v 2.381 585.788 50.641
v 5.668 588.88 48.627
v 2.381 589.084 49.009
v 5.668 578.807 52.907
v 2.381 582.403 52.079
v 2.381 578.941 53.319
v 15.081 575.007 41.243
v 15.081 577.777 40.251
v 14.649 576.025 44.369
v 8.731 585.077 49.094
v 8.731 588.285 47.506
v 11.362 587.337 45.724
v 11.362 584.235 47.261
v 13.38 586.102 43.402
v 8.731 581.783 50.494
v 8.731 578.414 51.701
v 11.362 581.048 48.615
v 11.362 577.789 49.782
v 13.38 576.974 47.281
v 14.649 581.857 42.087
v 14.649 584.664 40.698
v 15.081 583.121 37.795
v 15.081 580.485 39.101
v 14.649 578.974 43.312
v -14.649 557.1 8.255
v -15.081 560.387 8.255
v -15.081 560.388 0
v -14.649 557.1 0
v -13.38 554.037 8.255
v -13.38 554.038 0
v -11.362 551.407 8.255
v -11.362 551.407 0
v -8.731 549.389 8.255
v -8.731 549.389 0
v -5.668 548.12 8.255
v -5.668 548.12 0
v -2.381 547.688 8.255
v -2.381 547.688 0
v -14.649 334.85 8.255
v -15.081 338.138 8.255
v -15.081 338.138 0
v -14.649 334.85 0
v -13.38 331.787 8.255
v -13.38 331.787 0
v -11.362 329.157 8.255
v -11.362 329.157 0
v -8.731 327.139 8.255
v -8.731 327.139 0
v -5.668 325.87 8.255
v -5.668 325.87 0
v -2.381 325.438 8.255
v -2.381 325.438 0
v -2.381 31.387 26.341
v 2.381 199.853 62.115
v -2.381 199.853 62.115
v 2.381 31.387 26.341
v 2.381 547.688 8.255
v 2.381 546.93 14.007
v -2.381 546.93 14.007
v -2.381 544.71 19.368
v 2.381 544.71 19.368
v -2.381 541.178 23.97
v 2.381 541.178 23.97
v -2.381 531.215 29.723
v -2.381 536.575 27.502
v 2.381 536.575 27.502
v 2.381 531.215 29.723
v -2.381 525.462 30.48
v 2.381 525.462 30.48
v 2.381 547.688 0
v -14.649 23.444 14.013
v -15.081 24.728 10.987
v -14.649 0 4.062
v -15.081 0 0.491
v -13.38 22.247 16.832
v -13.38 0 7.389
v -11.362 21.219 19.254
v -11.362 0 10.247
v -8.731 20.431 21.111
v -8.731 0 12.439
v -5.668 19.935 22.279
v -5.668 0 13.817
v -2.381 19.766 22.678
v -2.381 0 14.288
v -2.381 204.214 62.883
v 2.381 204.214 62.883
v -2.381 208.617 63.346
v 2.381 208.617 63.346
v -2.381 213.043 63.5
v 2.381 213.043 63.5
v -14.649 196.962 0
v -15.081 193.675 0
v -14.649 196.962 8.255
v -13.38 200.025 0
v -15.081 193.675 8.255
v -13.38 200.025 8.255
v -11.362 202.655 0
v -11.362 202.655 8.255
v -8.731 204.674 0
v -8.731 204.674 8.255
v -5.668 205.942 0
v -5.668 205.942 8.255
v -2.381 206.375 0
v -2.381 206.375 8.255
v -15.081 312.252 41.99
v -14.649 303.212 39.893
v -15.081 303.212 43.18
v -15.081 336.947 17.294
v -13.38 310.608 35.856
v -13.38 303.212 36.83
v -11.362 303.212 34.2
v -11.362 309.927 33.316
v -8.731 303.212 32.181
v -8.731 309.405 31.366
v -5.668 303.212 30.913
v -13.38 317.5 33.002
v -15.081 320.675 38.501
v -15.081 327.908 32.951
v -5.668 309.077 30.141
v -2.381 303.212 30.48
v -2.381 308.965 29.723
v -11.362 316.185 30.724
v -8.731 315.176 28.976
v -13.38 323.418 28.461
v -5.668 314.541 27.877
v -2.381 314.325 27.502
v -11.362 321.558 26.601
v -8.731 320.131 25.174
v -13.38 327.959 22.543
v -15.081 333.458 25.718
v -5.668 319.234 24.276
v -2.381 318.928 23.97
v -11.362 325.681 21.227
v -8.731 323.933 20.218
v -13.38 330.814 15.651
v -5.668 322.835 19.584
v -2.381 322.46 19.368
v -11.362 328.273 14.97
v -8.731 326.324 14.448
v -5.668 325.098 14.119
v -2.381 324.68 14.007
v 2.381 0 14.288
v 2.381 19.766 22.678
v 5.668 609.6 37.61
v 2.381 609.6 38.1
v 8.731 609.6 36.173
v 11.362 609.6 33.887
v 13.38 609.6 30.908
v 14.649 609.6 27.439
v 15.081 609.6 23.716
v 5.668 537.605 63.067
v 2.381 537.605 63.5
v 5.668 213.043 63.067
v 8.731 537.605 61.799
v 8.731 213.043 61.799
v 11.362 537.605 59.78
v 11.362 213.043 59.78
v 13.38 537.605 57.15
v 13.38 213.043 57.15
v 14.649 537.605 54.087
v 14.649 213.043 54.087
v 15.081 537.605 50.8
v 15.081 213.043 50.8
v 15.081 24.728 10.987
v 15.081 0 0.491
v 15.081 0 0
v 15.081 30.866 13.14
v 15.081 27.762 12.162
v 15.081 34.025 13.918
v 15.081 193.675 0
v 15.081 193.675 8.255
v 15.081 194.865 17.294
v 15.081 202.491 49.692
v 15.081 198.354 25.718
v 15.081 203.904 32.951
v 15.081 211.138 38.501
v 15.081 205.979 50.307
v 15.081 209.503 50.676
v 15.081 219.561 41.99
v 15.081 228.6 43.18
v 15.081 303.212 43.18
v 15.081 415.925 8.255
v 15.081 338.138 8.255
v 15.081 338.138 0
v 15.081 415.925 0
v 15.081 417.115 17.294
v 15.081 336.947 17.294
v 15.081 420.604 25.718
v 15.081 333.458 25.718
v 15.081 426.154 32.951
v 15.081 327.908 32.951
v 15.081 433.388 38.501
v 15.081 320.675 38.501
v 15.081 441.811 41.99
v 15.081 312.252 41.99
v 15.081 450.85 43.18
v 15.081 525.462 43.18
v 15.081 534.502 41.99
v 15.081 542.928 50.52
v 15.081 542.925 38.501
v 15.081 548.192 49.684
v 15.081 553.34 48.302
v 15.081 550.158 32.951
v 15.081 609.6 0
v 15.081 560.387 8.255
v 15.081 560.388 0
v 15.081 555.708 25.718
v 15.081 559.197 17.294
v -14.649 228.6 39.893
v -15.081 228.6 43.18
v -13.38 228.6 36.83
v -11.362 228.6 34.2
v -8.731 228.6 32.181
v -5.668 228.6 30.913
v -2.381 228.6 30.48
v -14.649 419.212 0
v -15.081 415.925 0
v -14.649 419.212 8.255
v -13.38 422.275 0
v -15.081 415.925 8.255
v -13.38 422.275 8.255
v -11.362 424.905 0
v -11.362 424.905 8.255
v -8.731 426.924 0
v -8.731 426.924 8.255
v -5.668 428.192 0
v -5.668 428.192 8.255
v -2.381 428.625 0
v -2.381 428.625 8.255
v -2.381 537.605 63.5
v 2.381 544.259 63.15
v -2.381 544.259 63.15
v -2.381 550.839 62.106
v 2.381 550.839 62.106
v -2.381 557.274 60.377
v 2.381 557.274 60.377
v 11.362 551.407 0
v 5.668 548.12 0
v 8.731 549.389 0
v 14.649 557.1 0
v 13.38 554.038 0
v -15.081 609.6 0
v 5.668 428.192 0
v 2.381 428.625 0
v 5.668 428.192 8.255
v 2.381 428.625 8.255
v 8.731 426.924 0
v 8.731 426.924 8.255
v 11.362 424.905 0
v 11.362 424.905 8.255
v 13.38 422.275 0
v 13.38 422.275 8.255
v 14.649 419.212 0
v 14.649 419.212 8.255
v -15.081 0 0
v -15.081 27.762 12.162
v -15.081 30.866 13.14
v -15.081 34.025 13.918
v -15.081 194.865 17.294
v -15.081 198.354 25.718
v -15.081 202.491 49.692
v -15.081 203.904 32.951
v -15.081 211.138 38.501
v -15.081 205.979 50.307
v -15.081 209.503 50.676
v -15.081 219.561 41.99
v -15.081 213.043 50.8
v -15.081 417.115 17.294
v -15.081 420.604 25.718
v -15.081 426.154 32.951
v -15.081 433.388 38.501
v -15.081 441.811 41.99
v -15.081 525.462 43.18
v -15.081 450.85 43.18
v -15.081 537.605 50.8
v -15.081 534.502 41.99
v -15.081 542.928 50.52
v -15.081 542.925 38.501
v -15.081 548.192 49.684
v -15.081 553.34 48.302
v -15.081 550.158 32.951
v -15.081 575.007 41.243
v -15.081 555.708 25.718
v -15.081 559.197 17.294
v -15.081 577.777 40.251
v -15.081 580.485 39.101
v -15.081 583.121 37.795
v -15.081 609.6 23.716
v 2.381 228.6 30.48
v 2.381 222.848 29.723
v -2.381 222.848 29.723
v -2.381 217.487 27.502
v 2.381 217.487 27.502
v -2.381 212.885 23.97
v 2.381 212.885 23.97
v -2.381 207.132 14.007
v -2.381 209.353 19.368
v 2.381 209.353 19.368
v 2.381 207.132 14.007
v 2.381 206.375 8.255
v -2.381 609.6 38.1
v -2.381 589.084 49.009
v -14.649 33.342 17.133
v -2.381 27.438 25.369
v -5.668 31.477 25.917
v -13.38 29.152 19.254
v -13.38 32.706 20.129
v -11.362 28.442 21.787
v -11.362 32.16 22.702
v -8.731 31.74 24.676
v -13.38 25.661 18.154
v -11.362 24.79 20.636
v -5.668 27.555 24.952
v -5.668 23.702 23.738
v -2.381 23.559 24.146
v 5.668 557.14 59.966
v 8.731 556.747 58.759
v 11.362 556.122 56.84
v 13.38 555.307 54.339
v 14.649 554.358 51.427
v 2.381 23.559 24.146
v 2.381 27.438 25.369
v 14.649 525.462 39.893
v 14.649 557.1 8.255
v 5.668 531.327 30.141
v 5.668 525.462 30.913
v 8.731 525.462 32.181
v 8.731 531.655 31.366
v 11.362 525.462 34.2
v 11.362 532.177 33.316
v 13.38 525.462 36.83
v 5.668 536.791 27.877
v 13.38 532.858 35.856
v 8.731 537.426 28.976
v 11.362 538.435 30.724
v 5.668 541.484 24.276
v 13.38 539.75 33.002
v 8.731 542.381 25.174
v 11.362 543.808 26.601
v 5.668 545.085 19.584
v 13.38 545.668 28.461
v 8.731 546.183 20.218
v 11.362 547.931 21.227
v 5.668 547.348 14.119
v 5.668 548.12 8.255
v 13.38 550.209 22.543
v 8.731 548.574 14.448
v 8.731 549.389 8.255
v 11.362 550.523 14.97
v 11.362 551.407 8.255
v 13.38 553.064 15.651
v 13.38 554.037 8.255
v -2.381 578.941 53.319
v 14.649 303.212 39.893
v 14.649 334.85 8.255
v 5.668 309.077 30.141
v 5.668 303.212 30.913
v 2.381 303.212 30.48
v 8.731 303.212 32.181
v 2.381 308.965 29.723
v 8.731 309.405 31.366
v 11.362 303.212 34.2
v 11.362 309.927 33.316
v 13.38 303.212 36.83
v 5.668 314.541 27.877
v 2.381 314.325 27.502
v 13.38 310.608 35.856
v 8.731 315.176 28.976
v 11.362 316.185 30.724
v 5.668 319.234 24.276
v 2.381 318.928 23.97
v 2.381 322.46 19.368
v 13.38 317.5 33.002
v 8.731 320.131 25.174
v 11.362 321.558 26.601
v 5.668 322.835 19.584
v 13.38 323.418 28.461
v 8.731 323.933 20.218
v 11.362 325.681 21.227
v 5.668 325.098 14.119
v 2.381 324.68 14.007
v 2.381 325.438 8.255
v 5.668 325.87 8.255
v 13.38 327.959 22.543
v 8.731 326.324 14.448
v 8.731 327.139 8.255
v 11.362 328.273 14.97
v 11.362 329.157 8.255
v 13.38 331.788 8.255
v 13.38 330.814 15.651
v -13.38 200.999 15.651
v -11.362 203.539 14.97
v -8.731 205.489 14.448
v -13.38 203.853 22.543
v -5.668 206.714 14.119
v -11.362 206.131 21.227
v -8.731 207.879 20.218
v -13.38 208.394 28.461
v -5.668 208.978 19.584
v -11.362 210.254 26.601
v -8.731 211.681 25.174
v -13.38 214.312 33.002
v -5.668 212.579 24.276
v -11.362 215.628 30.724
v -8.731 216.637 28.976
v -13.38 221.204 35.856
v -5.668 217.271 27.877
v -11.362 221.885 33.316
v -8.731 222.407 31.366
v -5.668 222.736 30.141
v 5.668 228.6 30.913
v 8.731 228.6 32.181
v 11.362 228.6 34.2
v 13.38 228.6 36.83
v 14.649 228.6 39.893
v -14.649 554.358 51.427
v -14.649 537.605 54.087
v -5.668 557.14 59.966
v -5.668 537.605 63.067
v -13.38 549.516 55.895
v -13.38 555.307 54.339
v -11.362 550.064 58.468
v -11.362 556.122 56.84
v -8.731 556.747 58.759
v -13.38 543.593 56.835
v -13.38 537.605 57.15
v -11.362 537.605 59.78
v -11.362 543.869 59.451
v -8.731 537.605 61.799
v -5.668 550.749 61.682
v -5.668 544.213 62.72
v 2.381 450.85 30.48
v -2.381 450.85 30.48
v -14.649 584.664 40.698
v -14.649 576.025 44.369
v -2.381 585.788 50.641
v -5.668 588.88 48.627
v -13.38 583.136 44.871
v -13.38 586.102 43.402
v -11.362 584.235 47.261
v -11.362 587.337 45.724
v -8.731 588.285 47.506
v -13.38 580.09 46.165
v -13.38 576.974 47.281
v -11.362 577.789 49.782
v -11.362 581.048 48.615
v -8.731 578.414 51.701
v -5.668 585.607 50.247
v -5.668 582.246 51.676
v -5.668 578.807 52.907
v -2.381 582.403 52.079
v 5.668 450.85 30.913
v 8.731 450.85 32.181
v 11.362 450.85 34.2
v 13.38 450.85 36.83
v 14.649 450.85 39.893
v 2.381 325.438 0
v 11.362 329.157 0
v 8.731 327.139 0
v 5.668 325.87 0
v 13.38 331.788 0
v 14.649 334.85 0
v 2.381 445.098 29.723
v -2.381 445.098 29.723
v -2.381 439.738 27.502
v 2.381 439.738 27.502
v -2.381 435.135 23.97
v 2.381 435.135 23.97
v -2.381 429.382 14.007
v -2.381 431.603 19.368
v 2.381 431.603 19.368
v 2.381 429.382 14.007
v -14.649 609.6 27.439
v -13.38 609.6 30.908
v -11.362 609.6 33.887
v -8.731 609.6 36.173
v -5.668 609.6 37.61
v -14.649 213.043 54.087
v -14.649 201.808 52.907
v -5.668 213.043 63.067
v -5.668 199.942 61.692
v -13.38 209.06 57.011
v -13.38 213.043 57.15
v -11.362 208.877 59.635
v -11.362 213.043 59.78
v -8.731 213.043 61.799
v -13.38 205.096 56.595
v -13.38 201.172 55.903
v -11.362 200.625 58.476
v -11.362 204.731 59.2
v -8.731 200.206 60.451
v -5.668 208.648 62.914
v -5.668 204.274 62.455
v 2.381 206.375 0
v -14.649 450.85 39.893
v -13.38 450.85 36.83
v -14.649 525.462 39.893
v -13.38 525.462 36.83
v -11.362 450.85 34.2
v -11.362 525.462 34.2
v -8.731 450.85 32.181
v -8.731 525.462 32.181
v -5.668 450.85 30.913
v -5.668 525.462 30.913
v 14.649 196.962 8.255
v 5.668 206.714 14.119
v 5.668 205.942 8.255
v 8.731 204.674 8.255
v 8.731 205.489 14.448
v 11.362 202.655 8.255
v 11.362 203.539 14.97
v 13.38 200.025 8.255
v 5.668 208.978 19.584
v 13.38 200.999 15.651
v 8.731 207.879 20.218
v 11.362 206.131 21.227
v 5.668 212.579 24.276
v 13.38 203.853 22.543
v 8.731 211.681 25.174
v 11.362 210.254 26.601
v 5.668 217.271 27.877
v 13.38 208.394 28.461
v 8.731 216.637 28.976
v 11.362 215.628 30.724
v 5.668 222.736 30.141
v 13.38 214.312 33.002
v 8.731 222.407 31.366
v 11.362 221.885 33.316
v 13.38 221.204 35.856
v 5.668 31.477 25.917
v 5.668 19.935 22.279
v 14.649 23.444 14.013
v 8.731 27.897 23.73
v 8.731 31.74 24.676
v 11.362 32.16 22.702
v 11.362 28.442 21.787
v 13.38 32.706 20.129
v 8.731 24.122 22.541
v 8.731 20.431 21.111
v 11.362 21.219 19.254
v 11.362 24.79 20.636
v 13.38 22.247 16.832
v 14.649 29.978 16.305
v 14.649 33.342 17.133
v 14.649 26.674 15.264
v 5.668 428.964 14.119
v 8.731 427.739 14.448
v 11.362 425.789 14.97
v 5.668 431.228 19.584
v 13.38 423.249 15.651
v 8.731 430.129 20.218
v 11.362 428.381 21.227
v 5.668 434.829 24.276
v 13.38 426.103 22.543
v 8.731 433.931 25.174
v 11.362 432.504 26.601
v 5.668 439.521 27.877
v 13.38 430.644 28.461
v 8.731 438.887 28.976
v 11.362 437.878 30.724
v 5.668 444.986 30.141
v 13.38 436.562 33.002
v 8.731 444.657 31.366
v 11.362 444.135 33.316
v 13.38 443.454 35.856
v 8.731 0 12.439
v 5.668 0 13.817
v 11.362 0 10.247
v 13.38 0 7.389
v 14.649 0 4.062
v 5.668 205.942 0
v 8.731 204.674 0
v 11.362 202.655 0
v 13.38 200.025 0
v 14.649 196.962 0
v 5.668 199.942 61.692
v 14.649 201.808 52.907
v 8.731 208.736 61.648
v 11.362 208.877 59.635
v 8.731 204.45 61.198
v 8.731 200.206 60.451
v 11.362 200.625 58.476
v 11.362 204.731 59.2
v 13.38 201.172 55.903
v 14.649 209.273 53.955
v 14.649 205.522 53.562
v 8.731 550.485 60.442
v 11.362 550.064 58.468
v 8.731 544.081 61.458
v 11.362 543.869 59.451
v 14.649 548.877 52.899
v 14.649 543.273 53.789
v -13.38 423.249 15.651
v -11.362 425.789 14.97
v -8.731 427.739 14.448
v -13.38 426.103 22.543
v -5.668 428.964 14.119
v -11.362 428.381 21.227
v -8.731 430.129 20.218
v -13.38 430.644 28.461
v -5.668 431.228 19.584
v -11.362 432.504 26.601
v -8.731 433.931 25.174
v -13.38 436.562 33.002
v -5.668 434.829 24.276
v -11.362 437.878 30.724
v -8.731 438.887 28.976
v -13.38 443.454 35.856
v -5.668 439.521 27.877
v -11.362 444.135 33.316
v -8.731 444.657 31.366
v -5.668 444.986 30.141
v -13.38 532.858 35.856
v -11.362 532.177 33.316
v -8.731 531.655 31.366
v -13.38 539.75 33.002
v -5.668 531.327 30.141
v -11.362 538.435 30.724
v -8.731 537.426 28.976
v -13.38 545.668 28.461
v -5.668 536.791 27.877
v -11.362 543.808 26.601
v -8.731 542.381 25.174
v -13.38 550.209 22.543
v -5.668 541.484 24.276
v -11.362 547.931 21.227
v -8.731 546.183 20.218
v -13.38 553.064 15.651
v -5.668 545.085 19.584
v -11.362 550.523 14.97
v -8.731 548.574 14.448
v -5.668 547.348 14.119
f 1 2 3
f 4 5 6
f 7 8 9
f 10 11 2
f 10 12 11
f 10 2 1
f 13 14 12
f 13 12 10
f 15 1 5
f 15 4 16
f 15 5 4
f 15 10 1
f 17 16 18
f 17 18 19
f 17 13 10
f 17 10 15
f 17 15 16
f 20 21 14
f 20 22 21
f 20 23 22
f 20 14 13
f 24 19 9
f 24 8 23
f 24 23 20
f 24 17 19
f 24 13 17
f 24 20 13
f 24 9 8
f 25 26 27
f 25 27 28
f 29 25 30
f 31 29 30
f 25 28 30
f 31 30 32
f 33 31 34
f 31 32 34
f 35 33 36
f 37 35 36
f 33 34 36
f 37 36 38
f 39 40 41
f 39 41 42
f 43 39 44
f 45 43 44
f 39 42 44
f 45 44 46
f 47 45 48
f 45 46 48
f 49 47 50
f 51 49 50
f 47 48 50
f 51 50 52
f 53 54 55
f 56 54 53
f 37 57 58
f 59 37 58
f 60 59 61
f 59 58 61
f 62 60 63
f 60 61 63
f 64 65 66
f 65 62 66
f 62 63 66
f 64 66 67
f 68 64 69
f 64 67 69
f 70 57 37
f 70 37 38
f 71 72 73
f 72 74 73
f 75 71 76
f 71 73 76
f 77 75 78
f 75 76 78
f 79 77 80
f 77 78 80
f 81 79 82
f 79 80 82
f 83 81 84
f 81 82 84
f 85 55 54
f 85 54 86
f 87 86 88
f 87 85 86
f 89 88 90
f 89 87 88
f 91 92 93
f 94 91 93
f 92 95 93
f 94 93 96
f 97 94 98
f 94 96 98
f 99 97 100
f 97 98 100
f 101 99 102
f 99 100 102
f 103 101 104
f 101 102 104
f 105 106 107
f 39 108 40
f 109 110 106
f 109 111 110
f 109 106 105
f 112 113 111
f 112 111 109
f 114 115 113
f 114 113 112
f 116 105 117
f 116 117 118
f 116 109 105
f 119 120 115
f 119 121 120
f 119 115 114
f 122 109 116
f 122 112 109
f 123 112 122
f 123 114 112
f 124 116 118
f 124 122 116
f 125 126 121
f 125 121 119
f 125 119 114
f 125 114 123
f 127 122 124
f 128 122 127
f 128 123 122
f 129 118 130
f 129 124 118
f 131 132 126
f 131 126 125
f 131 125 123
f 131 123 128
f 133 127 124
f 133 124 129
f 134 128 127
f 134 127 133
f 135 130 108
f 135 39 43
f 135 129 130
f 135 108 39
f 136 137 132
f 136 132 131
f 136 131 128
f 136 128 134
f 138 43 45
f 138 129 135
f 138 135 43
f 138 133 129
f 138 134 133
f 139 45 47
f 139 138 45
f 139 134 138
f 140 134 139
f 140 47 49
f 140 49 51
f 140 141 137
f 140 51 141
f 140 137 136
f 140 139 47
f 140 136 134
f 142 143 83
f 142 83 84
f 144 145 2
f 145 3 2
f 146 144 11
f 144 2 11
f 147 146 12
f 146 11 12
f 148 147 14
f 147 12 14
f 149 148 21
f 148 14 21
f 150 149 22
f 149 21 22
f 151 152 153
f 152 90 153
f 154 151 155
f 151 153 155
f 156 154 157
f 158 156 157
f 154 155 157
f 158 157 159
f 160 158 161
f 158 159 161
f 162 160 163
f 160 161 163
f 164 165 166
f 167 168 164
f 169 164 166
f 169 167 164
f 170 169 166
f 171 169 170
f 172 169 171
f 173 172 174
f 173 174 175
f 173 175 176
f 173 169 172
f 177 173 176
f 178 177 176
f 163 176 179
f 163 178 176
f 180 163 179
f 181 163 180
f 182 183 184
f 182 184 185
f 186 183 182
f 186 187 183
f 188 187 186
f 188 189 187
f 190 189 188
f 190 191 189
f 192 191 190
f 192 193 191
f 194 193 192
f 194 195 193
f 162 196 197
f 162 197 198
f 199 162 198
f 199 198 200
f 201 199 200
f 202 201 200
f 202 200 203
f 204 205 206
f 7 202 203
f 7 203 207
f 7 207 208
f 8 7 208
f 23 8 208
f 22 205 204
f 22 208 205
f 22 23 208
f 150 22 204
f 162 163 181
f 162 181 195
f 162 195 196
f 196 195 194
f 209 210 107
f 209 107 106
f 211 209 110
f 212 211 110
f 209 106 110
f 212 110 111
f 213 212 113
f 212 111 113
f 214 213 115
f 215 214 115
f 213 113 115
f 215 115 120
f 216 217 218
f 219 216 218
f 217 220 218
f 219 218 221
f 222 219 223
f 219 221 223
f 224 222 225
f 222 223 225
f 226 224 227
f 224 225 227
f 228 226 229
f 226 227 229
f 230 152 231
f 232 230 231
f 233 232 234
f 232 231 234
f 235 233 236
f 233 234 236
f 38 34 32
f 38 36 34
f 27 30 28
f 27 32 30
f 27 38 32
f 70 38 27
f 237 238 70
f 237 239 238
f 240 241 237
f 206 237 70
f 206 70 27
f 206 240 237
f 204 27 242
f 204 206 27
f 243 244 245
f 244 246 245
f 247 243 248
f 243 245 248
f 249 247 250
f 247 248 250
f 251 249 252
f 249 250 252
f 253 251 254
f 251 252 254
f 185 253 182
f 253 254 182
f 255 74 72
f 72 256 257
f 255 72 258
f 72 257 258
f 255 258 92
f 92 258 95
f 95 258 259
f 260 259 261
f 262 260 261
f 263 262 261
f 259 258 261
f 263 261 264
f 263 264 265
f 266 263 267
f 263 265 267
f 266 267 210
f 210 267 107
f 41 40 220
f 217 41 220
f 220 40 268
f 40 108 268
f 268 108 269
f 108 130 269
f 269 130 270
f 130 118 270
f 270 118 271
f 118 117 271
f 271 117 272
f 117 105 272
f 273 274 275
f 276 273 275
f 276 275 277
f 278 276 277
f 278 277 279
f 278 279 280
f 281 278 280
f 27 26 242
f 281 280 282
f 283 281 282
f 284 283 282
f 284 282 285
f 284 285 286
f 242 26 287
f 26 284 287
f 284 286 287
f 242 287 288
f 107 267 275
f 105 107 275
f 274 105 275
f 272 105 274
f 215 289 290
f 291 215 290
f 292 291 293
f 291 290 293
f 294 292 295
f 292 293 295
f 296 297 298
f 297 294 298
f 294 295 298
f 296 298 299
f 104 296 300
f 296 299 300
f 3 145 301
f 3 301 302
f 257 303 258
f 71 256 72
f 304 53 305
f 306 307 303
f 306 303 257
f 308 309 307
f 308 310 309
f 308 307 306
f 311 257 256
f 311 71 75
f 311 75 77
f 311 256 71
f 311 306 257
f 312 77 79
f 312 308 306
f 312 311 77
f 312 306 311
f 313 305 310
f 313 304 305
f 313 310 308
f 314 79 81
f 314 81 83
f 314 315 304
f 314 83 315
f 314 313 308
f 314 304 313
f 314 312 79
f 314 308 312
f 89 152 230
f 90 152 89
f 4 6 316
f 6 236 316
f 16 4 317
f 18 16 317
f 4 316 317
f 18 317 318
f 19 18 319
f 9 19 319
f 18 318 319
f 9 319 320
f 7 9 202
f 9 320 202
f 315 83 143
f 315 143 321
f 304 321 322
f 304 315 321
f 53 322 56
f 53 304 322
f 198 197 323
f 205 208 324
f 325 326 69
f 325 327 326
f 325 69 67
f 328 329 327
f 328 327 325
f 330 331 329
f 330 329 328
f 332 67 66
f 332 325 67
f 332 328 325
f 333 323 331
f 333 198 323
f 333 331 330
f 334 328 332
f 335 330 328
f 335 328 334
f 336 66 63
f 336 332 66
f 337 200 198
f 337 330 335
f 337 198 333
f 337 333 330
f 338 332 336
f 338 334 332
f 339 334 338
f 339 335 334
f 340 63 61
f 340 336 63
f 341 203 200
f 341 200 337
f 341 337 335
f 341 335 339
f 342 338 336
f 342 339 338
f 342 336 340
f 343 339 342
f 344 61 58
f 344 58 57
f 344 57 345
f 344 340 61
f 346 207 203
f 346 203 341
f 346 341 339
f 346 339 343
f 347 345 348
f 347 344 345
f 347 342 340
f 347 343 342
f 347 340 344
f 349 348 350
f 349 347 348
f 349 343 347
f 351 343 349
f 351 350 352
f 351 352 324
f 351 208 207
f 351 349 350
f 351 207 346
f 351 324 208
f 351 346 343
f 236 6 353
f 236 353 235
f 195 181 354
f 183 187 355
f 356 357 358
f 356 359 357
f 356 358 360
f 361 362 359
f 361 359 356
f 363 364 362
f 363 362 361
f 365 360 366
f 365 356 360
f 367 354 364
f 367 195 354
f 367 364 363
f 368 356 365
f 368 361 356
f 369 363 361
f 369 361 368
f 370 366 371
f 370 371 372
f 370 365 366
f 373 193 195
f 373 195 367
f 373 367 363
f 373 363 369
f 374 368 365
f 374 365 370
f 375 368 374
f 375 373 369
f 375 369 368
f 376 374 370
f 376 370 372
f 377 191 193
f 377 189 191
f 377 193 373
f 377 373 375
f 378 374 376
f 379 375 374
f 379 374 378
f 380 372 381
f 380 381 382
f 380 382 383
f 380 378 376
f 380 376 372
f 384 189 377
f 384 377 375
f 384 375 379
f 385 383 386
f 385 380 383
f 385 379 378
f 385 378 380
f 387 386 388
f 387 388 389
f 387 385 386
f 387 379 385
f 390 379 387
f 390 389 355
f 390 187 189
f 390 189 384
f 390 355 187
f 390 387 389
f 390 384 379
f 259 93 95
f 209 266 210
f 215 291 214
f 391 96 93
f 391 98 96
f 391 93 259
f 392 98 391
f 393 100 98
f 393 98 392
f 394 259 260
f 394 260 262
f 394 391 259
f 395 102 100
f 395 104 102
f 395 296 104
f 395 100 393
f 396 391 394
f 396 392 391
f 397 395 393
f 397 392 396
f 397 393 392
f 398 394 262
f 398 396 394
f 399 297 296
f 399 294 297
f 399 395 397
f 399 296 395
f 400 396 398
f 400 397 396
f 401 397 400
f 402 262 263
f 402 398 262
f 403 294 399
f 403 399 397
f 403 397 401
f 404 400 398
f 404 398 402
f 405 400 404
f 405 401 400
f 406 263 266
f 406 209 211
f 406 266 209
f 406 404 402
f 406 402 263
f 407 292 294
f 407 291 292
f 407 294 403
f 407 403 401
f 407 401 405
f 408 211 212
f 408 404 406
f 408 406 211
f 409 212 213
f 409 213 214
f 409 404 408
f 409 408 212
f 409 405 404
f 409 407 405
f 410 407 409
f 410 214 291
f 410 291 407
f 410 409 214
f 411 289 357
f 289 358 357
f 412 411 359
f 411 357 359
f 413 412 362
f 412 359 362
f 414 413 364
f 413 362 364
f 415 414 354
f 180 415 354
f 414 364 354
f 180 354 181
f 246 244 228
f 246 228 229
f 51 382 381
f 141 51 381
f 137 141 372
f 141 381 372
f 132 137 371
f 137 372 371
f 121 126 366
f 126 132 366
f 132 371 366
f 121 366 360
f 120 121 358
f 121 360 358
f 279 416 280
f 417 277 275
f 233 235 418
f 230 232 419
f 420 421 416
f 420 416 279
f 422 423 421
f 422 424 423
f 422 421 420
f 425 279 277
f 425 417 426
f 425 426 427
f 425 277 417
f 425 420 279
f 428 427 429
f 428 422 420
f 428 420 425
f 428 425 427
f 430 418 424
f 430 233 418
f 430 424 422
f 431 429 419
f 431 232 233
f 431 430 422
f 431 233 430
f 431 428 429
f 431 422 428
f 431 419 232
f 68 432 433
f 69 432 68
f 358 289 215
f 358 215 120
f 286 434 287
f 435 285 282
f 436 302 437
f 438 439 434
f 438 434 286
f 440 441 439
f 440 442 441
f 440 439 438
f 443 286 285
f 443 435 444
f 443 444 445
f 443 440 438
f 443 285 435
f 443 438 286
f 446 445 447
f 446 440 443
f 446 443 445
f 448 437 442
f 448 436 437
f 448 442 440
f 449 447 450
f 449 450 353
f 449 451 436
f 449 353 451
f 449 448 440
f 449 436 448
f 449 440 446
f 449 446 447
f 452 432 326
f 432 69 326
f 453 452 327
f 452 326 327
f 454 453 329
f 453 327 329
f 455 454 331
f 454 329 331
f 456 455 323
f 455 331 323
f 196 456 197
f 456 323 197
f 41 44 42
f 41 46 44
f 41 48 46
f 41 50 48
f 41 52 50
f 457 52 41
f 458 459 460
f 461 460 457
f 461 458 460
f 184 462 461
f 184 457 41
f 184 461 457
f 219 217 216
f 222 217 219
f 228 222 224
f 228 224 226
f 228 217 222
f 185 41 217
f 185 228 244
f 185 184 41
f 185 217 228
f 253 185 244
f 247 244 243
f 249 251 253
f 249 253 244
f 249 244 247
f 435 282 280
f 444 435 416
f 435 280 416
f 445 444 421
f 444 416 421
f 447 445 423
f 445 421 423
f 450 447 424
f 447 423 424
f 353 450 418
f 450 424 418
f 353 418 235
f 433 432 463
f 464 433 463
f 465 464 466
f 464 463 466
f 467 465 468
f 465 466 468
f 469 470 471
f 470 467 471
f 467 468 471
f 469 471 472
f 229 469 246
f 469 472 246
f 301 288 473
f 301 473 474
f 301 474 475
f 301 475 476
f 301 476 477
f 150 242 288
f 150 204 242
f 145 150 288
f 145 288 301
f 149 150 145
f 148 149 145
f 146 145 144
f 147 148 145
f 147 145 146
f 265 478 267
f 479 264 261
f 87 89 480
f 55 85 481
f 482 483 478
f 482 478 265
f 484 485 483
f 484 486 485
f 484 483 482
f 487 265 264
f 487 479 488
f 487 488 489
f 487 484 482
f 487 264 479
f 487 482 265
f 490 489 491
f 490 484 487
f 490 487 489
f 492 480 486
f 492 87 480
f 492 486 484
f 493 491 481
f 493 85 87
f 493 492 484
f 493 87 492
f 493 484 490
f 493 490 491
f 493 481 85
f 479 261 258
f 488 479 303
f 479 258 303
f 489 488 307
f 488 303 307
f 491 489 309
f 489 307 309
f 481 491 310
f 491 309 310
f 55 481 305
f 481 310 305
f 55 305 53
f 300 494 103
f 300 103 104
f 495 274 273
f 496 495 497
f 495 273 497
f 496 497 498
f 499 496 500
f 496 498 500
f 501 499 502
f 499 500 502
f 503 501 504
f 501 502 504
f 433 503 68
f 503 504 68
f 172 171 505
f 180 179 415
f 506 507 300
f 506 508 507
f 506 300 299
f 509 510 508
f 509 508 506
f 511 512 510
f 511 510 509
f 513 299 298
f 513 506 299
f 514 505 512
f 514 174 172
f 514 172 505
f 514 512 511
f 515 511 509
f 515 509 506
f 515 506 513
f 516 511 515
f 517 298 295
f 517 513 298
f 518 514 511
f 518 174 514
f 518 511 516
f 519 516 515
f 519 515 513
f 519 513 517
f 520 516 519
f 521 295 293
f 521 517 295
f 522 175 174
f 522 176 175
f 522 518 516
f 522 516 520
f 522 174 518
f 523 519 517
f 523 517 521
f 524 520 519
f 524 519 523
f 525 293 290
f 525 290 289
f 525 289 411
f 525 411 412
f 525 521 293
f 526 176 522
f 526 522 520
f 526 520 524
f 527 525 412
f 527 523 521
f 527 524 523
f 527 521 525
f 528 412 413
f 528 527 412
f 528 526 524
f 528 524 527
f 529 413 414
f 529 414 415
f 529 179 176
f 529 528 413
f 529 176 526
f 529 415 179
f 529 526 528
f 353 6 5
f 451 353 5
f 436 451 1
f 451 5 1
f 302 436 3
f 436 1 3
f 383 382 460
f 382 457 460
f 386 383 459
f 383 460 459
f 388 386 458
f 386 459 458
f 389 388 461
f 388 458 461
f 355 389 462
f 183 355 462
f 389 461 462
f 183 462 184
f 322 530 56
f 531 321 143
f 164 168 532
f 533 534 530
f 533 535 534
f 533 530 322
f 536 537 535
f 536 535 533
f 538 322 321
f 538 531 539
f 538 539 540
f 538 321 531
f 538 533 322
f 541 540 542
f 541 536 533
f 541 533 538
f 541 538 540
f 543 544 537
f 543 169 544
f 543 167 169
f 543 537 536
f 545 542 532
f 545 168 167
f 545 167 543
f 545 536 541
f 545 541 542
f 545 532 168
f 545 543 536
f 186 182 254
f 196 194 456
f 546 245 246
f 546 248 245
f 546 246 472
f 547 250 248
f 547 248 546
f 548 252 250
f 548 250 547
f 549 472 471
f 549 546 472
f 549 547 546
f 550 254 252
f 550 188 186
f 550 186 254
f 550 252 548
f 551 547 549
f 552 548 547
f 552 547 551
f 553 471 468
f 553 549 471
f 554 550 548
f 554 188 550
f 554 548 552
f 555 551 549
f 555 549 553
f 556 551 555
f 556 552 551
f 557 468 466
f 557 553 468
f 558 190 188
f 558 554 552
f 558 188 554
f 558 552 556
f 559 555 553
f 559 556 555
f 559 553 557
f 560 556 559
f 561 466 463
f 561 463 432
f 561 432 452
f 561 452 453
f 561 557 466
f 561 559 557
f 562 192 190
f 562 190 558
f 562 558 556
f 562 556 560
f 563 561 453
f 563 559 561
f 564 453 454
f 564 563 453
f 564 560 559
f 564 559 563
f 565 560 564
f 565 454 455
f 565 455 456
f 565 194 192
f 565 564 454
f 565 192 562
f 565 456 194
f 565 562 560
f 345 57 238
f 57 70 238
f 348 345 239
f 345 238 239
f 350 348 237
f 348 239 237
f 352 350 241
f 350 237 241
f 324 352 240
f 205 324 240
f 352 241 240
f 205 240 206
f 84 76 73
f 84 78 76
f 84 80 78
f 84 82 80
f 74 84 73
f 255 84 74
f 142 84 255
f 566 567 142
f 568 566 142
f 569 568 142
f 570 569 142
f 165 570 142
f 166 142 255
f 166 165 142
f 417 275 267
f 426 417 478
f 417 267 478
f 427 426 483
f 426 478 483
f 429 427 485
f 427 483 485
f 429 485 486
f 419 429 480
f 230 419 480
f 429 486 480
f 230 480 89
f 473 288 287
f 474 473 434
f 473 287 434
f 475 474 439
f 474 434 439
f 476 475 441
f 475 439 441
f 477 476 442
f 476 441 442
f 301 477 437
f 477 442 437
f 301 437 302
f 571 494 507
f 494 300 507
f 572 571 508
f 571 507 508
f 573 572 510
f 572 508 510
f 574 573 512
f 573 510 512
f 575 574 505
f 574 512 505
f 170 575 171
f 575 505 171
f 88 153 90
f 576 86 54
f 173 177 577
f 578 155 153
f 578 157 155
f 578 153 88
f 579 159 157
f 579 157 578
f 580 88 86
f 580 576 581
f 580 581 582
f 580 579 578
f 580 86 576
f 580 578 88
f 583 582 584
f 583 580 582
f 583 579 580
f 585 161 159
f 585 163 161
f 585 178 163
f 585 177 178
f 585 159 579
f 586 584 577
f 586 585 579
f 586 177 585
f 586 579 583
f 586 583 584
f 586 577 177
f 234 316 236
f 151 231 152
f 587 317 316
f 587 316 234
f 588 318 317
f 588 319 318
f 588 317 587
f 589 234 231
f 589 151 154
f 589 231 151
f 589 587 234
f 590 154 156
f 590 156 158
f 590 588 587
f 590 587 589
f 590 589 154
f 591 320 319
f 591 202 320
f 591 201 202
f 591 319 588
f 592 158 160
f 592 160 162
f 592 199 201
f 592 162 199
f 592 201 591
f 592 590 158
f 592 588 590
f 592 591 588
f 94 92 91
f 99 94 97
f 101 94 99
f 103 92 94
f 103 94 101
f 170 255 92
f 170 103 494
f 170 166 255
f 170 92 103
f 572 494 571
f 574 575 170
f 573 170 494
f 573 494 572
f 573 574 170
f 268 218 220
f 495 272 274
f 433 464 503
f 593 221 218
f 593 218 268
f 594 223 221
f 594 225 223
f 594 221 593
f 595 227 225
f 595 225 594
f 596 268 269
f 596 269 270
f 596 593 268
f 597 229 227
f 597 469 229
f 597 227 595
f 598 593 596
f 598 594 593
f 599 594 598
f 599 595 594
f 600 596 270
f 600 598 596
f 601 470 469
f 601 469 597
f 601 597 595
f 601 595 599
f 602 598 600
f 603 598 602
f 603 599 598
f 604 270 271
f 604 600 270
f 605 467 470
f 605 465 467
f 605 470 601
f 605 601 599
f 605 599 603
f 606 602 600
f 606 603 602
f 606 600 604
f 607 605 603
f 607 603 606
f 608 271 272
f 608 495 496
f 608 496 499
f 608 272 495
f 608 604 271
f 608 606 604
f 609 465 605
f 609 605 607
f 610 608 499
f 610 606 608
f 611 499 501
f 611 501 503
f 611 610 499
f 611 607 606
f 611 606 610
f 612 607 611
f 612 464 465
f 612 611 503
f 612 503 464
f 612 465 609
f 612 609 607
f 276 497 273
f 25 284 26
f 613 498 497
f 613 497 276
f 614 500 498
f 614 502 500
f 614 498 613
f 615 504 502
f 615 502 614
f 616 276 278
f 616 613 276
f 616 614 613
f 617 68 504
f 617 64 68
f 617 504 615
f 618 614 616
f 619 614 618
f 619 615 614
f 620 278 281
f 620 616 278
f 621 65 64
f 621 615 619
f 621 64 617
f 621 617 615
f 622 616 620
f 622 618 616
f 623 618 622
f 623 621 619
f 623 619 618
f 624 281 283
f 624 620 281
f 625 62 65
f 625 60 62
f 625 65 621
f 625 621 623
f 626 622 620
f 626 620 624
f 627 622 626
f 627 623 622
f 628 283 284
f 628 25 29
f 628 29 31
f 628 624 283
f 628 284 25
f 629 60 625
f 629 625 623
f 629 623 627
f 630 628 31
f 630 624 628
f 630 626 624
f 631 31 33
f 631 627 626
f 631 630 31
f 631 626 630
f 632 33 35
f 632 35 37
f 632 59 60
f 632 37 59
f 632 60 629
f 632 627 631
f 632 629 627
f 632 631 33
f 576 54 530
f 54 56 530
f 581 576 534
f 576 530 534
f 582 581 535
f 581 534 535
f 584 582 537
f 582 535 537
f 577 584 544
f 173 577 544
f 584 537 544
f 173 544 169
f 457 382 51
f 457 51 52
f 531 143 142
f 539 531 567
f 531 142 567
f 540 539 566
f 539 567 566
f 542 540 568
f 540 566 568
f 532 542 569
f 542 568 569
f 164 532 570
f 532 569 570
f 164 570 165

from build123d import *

# Parameters (mm, degrees)
F1_DEPTH      = 15.08125
F1_DEPTH_BACK = 15.08125
F2_R          = 63.5
F3_R          = 22.225
F4_R          = 12.7


with BuildPart() as f1:
    # F0 (on Right) → F1 (new body, two sides)
    with BuildSketch(Plane.YZ) as f1_sk:
        Polygon((0, 14.2875), (0, 0), (206.375, 0), (206.375, 30.48), (325.4375, 30.48), (325.4375, 0), (428.625, 0), (428.625, 30.48), (547.6875, 30.48), (547.6875, 0), (609.6, 0), (609.6, 38.1), (584.2, 51.60542), (547.6875, 63.5), (206.375, 63.5), (25.4, 25.06916), align=None)
    extrude(amount=F1_DEPTH)
    extrude(f1_sk.sketch, amount=-F1_DEPTH_BACK)

    # F2
    f2_edges = [f1.edges().sort_by_distance(p)[0] for p in [
        (0, 25.4, 25.06916),
        (0, 206.375, 63.5),
        (0, 547.6875, 63.5),
        (0, 584.2, 51.60542),
    ]]
    fillet(f2_edges, radius=F2_R)

    # F3
    f3_edges = [f1.edges().sort_by_distance(p)[0] for p in [
        (0, 206.375, 30.48),
        (0, 325.4375, 30.48),
        (0, 428.625, 30.48),
        (0, 547.6875, 30.48),
    ]]
    fillet(f3_edges, radius=F3_R)

    # F4
    f4_edges = [f1.edges().sort_by_distance(p)[0] for p in [
        (15.08125, 265.90625, 30.48),
        (-15.08125, 265.90625, 30.48),
        (15.08125, 488.15625, 30.48),
        (-15.08125, 488.15625, 30.48),
        (15.08125, 375.324025, 63.5),
        (-15.08125, 375.324025, 63.5),
    ]]
    fillet(f4_edges, radius=F4_R)


solid = f1.part
